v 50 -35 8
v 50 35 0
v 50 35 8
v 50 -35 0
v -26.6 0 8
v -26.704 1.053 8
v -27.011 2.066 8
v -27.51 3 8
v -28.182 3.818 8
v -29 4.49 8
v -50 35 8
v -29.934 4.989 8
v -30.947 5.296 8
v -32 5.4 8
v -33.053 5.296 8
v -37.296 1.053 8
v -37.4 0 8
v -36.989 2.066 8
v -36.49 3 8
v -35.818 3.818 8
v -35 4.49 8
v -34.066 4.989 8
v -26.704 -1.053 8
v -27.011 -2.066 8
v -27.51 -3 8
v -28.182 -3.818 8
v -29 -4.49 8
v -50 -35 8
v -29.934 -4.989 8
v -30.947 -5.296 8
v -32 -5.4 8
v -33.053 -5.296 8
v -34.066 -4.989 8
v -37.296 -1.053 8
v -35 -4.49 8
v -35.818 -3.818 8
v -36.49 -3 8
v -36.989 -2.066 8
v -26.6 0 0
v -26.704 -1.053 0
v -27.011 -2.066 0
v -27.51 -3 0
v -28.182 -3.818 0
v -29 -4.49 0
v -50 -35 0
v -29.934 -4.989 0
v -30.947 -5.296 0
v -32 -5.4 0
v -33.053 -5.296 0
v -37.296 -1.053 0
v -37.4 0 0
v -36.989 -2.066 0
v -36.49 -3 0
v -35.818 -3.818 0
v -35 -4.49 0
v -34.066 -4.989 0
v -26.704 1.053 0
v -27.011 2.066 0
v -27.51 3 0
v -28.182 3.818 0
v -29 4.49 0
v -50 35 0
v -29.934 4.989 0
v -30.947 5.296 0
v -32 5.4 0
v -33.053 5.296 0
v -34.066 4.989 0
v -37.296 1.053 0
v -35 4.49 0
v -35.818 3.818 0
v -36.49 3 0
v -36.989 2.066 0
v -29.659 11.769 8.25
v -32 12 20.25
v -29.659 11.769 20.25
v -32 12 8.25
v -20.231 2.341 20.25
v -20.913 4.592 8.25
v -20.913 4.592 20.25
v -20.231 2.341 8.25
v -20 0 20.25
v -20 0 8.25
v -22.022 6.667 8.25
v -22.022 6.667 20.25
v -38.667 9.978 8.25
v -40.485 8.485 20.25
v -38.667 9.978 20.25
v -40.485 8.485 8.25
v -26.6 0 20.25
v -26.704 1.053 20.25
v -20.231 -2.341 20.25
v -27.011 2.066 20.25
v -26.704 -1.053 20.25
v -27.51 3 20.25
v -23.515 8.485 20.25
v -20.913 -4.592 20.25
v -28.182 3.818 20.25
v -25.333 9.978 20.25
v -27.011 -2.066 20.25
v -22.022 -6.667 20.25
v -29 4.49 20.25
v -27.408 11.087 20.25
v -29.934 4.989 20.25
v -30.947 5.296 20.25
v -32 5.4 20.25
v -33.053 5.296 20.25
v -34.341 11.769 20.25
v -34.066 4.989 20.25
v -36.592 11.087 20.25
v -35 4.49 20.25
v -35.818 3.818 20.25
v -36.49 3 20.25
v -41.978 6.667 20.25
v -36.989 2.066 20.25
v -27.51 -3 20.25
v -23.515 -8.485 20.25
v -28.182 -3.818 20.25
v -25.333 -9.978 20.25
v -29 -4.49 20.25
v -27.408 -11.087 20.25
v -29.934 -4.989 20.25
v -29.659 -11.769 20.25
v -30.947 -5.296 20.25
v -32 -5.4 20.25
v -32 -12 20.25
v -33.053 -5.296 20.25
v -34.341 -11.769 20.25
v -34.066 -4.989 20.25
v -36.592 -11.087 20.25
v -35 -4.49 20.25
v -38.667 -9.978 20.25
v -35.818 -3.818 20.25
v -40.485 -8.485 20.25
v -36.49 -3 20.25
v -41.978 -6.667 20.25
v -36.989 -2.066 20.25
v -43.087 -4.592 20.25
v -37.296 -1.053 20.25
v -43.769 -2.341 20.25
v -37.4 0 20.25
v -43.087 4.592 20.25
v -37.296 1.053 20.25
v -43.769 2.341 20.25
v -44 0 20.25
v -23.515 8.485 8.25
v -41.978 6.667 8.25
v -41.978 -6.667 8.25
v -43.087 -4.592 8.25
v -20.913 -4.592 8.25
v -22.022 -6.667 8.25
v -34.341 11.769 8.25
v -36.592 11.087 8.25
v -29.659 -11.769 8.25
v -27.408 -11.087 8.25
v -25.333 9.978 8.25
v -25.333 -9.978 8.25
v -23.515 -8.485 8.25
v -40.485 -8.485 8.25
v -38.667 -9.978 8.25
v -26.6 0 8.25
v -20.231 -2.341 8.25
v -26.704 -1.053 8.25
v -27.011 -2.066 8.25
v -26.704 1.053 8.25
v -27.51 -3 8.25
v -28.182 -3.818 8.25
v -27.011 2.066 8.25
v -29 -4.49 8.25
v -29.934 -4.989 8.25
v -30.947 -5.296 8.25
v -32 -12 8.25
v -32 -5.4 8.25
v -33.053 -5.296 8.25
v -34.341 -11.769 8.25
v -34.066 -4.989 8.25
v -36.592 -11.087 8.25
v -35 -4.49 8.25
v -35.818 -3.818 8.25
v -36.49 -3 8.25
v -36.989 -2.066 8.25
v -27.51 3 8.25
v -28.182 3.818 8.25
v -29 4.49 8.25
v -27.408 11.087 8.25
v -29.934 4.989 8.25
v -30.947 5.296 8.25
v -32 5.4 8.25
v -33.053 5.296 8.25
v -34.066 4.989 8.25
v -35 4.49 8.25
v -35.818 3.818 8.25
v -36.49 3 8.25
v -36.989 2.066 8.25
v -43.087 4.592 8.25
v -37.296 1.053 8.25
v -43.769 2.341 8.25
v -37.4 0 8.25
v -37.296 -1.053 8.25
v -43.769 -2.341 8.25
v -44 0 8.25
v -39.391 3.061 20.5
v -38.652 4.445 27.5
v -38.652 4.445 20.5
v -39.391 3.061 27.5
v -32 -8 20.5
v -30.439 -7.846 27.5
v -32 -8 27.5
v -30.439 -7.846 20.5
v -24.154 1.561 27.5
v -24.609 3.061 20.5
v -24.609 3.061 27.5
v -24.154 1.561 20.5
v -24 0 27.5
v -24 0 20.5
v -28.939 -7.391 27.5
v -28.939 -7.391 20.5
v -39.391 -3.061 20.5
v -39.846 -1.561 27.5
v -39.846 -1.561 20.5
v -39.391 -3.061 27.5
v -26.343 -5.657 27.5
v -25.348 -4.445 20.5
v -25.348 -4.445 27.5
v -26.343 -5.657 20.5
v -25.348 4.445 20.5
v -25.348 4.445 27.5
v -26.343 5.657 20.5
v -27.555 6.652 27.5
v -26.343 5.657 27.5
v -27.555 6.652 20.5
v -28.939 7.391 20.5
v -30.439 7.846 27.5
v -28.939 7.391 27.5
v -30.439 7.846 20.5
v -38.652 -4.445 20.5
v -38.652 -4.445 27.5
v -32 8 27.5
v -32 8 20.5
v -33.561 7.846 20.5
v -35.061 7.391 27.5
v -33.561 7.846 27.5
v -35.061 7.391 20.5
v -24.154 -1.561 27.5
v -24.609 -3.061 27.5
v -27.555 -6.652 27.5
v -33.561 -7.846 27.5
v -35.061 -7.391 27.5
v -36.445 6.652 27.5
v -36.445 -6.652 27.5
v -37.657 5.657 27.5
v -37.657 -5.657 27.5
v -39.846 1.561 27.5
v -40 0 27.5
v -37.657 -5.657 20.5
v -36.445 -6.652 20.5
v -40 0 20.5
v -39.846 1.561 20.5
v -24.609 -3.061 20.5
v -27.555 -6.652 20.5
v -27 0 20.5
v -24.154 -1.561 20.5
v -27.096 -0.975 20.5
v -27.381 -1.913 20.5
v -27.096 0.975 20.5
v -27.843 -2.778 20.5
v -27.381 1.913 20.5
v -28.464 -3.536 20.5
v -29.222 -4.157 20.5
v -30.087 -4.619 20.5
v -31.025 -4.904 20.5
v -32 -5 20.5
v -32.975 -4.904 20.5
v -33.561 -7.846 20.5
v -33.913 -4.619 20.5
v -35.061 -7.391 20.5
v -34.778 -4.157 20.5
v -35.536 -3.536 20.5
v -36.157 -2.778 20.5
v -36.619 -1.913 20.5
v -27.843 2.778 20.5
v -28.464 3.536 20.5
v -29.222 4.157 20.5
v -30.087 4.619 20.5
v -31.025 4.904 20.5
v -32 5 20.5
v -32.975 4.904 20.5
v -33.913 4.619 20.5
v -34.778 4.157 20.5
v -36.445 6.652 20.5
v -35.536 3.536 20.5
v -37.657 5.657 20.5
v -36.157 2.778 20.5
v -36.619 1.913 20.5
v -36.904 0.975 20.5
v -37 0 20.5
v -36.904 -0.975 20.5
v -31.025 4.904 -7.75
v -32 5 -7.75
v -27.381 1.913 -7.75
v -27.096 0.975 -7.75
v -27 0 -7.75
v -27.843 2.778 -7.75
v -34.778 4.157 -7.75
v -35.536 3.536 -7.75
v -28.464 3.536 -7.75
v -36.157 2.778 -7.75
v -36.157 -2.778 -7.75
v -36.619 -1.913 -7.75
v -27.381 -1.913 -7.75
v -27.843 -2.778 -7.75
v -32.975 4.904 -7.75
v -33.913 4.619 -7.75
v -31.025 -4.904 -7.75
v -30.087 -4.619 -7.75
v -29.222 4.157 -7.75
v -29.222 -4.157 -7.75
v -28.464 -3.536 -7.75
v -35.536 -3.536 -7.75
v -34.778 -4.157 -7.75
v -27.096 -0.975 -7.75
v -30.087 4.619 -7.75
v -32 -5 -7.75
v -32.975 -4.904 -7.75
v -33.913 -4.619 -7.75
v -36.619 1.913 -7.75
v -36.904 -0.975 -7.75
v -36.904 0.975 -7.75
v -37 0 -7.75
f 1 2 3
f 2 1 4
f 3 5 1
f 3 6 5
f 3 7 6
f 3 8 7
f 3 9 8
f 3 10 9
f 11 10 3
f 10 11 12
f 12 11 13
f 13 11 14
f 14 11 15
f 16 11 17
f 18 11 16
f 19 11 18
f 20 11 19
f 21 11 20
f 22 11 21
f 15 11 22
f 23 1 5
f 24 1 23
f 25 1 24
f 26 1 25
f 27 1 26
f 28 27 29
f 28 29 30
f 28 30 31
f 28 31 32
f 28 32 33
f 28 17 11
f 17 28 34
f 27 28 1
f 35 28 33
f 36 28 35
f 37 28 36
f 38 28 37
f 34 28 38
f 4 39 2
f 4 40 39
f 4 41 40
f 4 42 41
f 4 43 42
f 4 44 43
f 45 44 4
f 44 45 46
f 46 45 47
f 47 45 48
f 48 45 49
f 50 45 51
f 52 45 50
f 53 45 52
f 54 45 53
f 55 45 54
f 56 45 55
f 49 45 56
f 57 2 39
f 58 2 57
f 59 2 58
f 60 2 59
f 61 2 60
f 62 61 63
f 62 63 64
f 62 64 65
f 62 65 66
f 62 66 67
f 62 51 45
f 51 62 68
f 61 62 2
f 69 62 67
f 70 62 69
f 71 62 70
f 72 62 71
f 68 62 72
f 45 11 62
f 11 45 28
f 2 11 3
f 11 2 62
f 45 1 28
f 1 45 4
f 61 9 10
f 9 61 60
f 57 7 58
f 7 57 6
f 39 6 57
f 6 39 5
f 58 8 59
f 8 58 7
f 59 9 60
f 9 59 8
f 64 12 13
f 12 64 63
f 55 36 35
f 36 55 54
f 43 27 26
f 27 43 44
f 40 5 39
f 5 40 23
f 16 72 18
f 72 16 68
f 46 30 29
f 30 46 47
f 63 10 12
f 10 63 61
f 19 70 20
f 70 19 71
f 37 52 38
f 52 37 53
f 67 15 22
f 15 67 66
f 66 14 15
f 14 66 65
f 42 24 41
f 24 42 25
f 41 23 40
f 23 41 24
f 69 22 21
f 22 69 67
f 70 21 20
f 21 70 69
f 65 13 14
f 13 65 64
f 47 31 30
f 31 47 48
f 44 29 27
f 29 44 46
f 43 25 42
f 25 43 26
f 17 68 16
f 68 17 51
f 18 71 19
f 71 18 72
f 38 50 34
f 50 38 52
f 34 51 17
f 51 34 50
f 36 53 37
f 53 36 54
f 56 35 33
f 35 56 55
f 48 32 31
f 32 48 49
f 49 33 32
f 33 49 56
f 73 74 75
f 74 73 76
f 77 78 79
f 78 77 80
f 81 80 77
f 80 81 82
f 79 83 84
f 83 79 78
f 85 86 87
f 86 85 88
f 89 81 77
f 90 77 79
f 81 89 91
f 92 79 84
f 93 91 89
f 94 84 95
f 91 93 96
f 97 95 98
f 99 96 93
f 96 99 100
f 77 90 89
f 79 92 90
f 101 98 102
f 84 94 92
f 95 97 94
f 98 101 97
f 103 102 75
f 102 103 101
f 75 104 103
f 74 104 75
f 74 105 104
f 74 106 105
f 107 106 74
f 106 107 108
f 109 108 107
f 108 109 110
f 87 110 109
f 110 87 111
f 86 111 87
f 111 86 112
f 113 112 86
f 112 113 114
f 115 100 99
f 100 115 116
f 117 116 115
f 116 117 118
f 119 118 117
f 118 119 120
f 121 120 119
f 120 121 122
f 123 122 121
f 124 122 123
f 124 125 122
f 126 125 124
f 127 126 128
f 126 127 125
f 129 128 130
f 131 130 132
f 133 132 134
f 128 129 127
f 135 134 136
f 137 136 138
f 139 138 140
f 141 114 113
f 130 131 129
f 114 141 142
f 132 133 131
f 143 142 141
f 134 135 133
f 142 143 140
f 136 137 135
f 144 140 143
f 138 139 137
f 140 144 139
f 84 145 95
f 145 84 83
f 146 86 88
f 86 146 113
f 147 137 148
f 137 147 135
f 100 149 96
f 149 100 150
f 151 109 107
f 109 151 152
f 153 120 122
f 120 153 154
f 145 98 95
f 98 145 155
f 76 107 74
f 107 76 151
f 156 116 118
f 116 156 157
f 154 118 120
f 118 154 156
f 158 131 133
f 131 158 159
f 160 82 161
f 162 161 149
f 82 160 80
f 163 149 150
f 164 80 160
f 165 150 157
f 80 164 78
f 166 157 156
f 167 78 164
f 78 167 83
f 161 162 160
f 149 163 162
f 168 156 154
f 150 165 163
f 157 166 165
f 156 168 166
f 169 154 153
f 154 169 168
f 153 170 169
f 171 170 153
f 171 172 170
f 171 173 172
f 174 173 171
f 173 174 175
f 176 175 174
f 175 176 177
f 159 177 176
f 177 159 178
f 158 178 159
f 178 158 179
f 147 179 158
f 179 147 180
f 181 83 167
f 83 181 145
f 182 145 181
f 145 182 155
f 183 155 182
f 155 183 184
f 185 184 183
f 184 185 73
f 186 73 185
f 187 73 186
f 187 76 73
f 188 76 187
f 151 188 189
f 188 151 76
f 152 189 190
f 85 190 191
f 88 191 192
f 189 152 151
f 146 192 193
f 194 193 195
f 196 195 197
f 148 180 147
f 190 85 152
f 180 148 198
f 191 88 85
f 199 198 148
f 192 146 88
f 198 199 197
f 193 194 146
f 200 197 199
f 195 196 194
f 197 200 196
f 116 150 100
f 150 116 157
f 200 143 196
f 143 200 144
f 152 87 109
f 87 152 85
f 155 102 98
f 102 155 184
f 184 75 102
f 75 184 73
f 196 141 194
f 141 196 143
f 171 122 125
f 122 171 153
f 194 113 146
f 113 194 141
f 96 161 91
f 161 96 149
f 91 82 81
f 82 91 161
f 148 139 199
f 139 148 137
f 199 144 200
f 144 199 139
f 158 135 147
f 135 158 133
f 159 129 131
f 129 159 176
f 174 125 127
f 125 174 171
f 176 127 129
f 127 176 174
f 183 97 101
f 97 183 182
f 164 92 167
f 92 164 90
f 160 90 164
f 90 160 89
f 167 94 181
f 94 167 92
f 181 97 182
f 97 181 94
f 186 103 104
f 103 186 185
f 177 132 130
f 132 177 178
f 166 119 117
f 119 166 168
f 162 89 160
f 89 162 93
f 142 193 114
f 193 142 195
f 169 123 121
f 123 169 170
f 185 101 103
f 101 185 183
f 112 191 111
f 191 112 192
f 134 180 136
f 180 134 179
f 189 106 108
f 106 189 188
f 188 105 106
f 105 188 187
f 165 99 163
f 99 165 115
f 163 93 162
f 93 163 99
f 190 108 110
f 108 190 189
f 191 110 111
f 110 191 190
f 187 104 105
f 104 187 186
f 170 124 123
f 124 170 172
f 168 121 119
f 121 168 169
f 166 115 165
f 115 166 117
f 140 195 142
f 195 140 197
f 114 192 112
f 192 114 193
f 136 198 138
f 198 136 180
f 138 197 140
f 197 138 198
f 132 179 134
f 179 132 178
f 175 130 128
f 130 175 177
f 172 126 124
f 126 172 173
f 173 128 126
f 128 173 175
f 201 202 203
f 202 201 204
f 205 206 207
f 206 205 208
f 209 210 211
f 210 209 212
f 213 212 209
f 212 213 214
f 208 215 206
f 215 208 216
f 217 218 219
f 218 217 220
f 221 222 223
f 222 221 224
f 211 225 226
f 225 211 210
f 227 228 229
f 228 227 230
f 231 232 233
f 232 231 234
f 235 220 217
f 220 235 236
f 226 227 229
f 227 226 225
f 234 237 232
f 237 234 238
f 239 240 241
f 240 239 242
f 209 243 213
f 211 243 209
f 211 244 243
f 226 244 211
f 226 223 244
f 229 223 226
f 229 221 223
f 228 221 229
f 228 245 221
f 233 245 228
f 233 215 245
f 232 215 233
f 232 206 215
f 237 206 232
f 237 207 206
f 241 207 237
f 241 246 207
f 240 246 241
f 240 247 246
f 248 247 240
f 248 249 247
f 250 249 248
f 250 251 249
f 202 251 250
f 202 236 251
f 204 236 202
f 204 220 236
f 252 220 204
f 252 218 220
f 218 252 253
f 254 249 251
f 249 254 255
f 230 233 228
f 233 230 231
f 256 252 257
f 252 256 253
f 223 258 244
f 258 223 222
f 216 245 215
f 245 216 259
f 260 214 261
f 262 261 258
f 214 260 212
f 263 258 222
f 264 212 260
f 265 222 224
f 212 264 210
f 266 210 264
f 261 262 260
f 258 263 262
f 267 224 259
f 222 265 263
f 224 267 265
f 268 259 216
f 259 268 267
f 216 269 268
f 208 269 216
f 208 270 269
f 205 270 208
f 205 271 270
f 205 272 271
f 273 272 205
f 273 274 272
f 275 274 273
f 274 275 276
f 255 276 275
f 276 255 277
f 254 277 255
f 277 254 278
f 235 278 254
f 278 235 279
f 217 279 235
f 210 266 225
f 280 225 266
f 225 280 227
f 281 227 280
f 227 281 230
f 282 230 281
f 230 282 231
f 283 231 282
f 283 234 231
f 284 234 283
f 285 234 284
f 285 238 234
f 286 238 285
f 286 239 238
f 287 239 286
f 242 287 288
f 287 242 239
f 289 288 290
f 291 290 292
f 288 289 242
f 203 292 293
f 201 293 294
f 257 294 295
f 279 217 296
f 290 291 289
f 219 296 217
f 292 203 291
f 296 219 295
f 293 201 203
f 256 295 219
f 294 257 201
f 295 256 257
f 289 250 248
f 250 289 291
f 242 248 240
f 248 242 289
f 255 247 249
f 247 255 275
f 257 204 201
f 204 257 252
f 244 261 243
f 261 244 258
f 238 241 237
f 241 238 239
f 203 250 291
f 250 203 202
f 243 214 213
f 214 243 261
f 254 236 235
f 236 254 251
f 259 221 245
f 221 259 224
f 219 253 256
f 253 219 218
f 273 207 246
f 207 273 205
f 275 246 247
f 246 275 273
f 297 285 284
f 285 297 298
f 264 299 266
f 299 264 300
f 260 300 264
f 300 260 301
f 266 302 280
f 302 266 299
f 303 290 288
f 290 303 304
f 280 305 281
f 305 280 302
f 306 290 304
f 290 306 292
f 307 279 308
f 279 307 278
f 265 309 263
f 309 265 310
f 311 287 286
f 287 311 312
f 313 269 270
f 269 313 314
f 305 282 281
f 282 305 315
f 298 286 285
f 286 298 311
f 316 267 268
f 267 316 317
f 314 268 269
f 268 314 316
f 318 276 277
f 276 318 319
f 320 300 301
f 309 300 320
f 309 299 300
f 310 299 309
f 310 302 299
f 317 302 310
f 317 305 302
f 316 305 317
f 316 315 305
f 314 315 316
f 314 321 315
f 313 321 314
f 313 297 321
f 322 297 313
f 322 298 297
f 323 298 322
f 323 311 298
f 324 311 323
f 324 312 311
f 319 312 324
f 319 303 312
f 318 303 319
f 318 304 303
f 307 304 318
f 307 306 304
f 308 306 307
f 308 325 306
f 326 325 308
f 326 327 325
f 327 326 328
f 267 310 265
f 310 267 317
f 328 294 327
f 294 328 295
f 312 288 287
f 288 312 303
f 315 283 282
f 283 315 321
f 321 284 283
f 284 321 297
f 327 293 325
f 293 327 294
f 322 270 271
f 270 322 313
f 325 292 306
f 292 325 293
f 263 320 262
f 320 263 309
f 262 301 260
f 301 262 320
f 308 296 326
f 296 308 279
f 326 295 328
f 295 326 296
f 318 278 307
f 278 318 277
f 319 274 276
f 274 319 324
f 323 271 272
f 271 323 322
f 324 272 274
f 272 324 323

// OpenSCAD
$fn = 32;

// ------------------------------------------------------------------------
// Standoff columns: 1 d24 standoffs, bolts d10
// Every part is its own module, assembly() places them once.
// ------------------------------------------------------------------------

// --- part 1 ---
module base_plate() {
  difference() {
    translate([-50, -35, 0]) cube([100, 70, 8]);
    translate([-32, 0, -1]) cylinder(h = 10, d = 10.8);
  }
}

// --- part 2 ---
module spacer() {
  difference() {
      translate([0, 0, 0]) cylinder(h = 12, d = 24);
      translate([0, 0, -1]) cylinder(h = 14, d = 10.8);
    }
}

// --- part 3 ---
module bolt() {
  cylinder(h = 7, d = 16);
  translate([0, 0, -28.25]) cylinder(h = 28.25, d = 10);
}

// --- assembly ---
module assembly() {
  translate([0, 0, 0]) rotate([0, 0, 0]) base_plate();
  translate([-32, 0, 8.25]) rotate([0, 0, 0]) spacer();
  translate([-32, 0, 20.5]) rotate([0, 0, 0]) bolt();
}

assembly();
